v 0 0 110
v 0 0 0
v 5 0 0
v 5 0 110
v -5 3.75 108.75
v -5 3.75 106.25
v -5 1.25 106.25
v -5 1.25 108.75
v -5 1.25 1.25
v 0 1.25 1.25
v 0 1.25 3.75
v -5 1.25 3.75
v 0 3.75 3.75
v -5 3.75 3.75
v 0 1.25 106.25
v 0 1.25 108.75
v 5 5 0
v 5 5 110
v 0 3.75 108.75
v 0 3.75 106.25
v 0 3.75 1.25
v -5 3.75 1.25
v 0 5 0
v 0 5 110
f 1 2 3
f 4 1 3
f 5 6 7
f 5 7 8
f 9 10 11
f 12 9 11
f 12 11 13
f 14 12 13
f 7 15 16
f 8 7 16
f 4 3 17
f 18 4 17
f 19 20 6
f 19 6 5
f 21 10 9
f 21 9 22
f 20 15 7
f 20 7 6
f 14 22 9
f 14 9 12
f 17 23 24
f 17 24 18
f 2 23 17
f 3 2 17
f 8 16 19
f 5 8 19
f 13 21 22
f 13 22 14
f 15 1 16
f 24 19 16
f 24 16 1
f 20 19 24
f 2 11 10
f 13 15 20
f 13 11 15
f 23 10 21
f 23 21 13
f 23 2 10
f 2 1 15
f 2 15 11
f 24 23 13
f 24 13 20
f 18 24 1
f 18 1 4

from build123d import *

# Parameters (mm, degrees)
SKETCH1_W           = 5
SKETCH1_H           = 5
BOSS_EXTRUDE1_DEPTH = 110
SKETCH2_W           = 2.5
SKETCH2_H           = 2.5
BOSS_EXTRUDE2_DEPTH = 5


with BuildPart() as part:
    # Sketch1 → Boss-Extrude1 (new body)
    with BuildSketch(Plane.XY):
        with Locations((2.5, 2.5)):
            Rectangle(SKETCH1_W, SKETCH1_H)
    extrude(amount=BOSS_EXTRUDE1_DEPTH)

    # Sketch2 → Boss-Extrude2 (add)
    with BuildSketch(Plane.ZY):
        with Locations((2.5, 2.5)):
            Rectangle(SKETCH2_W, SKETCH2_H)
        with Locations((107.5, 2.5)):
            Rectangle(SKETCH2_W, SKETCH2_H)
    extrude(amount=BOSS_EXTRUDE2_DEPTH)


solid = part.part
